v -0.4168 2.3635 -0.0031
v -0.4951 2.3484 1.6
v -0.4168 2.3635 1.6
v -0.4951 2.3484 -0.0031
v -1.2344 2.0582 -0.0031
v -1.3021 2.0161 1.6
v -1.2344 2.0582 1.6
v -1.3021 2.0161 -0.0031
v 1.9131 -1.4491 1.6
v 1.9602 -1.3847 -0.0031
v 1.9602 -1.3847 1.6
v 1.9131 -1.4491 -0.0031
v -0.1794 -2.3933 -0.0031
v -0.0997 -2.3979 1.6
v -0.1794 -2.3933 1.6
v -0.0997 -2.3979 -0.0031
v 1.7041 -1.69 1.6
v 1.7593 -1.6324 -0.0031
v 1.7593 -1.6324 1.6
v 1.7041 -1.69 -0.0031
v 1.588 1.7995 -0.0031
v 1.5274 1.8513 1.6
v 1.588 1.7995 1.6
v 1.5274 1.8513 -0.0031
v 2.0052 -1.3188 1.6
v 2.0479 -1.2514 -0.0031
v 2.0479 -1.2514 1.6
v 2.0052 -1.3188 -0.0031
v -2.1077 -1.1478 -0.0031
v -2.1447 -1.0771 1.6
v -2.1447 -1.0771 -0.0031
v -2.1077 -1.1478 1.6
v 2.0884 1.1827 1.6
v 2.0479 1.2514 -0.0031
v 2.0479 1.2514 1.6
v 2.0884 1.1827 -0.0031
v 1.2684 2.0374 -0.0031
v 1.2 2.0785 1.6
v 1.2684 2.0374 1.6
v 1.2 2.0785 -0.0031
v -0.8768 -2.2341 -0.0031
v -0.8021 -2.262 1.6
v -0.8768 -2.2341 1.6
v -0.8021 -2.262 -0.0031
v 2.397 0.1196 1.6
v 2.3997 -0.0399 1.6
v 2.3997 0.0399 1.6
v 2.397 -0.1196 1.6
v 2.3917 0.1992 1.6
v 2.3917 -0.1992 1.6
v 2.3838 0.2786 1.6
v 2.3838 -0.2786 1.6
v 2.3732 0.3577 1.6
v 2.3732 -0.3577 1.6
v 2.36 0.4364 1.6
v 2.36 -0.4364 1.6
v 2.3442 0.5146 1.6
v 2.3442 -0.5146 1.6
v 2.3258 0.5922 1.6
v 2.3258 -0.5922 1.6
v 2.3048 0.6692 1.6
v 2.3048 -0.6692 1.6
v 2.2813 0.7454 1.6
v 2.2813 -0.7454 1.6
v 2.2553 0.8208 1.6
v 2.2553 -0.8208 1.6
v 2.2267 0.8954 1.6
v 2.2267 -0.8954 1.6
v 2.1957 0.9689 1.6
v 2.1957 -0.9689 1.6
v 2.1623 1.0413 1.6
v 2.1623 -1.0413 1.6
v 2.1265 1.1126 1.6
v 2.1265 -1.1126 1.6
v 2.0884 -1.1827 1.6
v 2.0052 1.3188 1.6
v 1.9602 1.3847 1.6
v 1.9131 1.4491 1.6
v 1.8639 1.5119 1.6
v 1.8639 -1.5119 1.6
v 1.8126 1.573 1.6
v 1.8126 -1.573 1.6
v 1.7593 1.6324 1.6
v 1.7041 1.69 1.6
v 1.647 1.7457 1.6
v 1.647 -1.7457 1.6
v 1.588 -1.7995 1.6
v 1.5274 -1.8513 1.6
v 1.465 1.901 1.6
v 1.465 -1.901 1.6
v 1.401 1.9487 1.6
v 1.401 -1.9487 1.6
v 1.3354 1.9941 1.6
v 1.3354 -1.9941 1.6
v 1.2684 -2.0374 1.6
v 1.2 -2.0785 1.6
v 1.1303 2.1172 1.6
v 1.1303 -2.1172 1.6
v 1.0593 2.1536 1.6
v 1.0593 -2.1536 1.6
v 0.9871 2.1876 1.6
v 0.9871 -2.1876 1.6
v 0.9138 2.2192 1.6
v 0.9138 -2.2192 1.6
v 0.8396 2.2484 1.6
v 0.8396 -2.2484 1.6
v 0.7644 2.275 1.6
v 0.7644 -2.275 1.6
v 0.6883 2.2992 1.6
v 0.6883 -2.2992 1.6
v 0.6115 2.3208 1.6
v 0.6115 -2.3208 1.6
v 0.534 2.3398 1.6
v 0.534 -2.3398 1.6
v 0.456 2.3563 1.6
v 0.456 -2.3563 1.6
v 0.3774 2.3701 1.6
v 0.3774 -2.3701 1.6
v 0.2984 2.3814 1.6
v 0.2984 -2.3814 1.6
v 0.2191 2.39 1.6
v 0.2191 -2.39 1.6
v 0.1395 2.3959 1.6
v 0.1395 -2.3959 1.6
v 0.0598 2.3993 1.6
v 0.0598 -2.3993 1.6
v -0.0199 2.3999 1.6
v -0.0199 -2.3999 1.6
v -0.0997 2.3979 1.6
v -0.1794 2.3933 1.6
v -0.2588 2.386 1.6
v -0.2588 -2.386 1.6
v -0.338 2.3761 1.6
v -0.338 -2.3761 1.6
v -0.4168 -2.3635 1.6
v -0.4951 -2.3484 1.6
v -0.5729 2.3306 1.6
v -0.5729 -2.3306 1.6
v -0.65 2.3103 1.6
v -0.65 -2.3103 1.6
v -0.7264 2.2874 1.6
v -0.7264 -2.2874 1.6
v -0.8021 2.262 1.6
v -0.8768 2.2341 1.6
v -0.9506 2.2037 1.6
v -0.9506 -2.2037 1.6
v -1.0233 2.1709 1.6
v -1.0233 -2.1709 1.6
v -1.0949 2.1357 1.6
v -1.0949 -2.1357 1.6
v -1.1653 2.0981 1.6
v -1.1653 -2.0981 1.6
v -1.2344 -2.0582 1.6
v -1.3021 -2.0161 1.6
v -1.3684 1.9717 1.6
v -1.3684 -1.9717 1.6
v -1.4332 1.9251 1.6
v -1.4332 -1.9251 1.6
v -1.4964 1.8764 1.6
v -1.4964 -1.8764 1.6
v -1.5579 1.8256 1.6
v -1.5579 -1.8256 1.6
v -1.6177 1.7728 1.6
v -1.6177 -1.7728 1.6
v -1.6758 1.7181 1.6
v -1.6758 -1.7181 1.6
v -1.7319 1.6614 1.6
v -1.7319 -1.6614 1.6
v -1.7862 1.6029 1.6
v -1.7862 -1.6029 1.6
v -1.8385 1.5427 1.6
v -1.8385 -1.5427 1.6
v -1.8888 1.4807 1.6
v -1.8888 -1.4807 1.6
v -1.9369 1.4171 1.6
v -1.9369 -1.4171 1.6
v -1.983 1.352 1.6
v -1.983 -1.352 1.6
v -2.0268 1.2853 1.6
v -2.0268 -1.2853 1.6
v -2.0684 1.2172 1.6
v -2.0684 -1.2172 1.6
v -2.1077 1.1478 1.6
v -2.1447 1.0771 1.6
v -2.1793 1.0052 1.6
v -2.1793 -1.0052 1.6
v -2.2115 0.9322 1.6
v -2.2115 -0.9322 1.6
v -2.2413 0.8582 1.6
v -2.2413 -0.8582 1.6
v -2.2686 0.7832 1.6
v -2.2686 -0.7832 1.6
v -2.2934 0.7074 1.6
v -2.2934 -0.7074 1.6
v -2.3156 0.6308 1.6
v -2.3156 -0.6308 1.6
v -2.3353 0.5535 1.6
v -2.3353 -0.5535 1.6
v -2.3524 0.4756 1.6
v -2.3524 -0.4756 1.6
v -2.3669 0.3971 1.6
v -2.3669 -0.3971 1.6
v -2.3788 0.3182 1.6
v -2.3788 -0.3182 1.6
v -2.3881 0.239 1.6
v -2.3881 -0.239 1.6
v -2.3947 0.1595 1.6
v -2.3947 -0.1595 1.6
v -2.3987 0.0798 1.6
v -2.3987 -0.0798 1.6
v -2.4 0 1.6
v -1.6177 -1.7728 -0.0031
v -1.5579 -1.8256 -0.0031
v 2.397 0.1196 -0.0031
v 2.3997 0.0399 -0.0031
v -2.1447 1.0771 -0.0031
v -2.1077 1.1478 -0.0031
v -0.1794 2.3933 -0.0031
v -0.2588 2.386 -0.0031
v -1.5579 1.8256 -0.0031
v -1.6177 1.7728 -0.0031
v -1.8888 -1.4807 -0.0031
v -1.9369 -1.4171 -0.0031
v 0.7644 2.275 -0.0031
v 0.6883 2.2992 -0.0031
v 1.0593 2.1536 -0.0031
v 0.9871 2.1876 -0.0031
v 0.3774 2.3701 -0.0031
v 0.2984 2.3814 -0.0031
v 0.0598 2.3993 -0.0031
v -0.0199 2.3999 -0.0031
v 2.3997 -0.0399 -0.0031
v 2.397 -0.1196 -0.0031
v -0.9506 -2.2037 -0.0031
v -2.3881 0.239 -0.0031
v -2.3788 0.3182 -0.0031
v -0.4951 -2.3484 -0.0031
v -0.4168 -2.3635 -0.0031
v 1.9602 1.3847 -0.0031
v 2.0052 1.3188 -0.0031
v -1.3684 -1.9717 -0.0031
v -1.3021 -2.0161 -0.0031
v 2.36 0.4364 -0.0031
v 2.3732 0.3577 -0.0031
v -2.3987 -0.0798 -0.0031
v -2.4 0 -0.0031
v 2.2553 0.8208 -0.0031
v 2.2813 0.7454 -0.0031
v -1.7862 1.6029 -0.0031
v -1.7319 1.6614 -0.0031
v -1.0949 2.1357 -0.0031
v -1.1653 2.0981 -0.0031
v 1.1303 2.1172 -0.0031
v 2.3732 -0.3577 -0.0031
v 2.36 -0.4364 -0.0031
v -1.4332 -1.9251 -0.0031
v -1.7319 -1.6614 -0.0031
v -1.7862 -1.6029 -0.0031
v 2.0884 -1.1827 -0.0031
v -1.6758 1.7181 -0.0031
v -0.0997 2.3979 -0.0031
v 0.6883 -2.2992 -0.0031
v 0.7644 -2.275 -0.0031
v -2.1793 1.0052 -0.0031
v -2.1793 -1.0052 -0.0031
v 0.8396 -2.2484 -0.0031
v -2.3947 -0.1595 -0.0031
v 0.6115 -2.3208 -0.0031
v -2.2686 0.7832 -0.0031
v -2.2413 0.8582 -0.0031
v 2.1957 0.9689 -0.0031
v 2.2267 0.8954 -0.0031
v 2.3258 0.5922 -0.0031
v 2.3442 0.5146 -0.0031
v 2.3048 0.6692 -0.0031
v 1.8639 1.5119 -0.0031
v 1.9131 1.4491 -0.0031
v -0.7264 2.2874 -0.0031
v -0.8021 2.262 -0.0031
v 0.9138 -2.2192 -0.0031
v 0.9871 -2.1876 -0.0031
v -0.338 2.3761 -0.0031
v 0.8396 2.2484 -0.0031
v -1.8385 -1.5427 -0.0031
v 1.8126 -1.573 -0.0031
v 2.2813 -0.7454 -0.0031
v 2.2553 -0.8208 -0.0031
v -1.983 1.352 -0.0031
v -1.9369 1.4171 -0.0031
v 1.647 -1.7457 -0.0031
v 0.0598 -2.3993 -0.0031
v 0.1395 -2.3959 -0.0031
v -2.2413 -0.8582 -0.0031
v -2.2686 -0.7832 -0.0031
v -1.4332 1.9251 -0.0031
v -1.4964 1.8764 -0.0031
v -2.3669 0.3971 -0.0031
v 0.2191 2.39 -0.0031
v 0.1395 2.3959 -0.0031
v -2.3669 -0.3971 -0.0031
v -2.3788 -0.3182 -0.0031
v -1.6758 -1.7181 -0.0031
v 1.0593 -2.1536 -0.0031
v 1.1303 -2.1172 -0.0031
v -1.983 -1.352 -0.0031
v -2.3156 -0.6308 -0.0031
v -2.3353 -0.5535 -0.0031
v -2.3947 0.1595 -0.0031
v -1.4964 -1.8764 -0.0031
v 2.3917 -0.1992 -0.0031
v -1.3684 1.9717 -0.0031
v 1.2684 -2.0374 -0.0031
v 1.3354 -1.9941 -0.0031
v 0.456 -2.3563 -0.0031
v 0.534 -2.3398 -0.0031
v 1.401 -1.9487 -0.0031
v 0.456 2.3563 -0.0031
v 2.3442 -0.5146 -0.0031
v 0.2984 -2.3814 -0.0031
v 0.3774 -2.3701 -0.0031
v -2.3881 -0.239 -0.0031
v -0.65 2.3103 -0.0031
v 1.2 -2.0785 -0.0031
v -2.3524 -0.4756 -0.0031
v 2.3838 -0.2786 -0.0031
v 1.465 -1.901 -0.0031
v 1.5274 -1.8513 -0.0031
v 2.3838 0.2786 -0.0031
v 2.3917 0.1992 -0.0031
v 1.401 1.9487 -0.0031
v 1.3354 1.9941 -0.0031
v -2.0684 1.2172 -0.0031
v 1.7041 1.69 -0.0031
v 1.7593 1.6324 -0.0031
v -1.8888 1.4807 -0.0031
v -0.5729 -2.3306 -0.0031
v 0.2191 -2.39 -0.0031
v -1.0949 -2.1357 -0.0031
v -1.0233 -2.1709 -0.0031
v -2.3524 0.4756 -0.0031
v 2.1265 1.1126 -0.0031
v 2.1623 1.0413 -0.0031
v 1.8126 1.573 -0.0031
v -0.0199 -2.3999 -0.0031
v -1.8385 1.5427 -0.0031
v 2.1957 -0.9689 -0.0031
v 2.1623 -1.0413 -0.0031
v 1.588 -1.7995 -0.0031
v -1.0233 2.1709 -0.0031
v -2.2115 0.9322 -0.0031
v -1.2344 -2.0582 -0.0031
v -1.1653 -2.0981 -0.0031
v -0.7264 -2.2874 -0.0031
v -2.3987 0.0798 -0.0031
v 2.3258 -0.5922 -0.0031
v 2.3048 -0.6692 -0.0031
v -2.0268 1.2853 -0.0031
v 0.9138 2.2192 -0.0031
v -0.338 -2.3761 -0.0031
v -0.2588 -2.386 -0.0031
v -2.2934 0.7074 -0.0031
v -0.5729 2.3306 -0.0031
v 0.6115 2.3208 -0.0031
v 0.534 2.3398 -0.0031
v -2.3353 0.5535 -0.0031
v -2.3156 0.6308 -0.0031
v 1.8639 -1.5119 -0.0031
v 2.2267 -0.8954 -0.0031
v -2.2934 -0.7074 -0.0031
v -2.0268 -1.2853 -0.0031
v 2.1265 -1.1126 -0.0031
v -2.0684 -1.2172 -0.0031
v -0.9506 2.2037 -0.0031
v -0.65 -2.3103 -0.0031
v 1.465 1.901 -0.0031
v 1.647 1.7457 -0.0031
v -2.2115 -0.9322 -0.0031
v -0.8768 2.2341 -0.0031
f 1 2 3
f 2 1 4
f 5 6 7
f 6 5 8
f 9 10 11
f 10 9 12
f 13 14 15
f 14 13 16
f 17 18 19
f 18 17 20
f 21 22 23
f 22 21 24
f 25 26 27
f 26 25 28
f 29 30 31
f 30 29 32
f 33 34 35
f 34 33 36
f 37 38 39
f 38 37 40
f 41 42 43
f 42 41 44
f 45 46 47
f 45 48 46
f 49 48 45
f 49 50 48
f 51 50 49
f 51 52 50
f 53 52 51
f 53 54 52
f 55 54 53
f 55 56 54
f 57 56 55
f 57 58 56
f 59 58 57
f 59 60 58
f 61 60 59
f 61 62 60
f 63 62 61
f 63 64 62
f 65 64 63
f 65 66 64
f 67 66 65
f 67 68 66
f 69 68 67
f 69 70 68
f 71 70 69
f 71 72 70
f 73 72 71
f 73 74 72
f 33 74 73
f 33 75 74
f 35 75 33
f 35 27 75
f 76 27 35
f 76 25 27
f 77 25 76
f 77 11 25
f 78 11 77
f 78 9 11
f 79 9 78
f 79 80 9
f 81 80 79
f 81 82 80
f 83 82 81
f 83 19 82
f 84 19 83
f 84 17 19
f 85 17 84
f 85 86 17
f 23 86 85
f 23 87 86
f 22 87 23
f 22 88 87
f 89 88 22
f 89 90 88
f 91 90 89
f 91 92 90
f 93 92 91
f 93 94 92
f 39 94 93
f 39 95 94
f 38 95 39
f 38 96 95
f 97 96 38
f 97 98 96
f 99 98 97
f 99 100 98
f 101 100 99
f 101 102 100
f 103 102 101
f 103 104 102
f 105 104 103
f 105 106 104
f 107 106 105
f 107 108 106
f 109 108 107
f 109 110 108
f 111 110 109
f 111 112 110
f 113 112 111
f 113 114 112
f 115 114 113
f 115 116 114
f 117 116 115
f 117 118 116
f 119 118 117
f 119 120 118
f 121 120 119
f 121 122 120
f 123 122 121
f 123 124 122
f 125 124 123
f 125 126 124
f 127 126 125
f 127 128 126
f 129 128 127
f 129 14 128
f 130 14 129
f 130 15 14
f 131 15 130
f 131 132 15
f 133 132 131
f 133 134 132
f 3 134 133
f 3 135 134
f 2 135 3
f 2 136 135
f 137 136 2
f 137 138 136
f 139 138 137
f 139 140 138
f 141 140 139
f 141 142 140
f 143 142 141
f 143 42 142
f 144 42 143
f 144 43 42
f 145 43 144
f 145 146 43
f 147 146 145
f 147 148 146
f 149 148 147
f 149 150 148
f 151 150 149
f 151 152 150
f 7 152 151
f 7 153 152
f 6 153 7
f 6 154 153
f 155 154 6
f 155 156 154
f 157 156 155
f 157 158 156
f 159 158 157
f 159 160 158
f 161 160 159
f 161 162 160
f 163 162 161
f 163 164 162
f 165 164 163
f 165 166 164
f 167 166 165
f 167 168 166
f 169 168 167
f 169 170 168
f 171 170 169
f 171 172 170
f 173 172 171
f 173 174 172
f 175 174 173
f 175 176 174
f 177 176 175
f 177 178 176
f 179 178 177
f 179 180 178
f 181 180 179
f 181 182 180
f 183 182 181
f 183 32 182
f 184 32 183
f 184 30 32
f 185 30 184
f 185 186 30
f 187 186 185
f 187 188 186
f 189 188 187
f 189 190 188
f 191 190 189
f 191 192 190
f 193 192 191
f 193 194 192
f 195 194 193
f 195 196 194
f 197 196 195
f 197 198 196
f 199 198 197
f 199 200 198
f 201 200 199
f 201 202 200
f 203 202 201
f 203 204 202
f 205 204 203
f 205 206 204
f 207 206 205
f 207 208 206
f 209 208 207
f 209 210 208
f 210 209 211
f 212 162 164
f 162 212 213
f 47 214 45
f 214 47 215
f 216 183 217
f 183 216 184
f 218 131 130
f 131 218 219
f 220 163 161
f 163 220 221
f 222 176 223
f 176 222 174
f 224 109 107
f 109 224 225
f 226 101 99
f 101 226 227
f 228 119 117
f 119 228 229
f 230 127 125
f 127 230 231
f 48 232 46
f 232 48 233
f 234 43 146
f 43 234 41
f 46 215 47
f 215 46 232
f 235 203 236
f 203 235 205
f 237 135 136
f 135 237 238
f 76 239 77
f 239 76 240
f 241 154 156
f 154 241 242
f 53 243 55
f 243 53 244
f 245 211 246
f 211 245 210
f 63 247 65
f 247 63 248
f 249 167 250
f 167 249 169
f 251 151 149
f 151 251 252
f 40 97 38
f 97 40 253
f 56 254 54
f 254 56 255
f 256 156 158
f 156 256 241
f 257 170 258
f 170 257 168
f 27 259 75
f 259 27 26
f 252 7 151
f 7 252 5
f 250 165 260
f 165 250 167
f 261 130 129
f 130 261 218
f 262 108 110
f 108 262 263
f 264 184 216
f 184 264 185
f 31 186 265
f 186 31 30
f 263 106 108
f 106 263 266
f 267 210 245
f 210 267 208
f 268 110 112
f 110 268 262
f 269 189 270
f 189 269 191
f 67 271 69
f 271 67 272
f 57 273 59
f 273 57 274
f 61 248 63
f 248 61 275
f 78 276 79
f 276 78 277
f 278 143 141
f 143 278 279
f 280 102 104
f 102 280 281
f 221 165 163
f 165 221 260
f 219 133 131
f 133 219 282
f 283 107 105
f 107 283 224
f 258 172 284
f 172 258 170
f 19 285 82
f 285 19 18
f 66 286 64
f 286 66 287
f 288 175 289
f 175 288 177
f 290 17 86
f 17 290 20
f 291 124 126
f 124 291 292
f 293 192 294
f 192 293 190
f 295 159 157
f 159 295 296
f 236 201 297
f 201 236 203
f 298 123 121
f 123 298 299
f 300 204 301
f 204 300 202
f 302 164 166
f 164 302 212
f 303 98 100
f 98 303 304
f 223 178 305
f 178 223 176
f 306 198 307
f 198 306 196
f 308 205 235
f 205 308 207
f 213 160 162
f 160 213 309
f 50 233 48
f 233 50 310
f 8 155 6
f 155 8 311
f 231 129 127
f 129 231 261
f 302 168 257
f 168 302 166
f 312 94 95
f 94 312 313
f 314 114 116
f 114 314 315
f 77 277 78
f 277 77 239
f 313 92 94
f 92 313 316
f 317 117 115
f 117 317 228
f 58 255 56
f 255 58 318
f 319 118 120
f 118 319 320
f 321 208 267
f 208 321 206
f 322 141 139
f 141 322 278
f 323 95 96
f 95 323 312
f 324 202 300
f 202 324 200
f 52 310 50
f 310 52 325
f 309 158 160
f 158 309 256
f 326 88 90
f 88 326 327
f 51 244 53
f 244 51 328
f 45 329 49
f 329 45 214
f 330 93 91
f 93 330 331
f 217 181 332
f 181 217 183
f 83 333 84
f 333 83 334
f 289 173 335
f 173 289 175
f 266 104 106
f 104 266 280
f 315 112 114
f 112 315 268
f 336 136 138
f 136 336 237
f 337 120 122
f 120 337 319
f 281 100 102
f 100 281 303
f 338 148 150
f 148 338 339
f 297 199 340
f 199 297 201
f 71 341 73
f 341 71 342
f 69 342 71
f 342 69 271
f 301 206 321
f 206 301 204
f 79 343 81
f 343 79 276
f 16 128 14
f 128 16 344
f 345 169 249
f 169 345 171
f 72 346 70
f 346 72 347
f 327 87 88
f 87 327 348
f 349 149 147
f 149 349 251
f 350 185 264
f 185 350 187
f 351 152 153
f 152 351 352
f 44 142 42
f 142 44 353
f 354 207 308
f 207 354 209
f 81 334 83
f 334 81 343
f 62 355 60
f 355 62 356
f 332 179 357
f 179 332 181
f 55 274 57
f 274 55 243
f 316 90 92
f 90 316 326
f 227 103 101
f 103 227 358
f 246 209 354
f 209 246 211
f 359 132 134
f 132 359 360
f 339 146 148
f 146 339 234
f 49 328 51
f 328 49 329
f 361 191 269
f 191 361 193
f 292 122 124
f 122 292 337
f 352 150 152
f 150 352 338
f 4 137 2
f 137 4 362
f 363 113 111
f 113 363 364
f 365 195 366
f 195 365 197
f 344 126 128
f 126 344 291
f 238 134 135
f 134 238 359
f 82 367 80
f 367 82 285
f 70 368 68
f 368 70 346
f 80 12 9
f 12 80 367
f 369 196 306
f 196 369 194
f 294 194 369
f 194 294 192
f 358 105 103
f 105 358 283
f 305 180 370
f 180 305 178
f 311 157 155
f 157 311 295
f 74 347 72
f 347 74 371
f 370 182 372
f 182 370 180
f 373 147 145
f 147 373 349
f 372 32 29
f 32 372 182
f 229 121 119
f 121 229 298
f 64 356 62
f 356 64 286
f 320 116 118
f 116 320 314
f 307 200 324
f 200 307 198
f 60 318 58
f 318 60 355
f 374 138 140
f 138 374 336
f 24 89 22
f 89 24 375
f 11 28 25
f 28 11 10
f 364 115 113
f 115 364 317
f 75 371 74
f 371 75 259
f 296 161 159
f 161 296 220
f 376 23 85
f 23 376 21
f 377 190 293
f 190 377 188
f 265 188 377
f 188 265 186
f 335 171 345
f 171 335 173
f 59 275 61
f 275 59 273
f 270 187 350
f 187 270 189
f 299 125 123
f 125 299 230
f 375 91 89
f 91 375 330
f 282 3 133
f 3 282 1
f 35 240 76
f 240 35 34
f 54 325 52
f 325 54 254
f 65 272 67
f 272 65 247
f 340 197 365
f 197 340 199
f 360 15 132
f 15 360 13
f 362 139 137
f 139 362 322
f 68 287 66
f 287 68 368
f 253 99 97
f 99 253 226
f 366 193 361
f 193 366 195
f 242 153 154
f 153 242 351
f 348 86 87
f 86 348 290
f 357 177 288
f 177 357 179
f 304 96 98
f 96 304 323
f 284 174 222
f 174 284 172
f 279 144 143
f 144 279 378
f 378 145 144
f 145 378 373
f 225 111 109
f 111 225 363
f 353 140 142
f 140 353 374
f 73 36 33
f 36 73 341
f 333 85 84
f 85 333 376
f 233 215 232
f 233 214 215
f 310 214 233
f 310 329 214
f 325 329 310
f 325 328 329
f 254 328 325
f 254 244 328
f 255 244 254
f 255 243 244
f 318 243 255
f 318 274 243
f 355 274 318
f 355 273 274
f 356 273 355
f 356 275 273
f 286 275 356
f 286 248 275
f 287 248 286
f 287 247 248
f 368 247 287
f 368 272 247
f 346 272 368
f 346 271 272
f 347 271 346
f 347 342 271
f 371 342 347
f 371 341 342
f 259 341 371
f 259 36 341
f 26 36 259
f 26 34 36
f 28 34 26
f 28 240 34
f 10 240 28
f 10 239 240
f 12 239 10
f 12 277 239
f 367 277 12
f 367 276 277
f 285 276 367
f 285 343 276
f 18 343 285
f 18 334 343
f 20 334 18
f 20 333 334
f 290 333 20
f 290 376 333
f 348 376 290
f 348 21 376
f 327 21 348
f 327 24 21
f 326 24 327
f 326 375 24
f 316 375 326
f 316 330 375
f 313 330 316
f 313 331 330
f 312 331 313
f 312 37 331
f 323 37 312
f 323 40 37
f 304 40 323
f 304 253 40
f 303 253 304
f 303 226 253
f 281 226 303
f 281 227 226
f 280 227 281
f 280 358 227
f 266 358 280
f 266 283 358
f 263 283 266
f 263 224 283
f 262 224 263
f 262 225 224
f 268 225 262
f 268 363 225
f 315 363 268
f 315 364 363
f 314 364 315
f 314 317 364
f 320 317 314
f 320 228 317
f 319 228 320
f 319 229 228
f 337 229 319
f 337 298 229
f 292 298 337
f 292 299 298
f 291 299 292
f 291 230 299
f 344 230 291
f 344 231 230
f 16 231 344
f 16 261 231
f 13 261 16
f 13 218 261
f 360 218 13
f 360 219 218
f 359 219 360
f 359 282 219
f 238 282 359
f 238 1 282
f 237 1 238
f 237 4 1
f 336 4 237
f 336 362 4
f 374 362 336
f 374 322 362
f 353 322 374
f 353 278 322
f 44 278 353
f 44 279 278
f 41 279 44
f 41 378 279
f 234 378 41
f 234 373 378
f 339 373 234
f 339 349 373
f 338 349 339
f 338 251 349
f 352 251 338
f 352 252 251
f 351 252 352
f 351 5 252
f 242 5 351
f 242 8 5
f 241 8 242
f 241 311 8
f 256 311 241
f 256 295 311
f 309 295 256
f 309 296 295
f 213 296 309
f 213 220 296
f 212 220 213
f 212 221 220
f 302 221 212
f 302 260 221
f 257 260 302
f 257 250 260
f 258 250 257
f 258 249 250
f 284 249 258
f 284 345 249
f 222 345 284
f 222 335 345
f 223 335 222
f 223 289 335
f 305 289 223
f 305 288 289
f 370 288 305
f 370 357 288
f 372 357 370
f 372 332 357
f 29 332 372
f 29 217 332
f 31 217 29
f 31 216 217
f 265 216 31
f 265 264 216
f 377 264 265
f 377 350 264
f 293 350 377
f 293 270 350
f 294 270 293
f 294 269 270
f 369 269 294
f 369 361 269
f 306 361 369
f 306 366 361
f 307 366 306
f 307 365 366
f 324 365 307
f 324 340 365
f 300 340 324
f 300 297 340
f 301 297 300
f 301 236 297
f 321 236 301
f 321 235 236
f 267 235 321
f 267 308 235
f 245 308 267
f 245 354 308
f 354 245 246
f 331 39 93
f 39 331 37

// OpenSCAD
use <../lib.scad>
use <../p/1-4disc.scad>
use <../p/1-4ndis.scad>
use <../p/3-8disc.scad>
use <s/4088s01.scad>
use <s/4088s02.scad>
$fa=1; $fs=0.2;
function ldraw_lib__4088b(realsolid=false) = [
// 0 Brick  1 x  4 x  2 with Centre Stud Top with Underside Reinforcement
// 0 Name: 4088b.dat
// 0 Author: Chris Dee [cwdee]
// 0 !LDRAW_ORG Part UPDATE 2018-01
// 0 !LICENSE Licensed under CC BY 2.0 and CC BY 4.0 : see CAreadme.txt
// 
// 0 BFC CERTIFY CCW
  [0,"BFC","CERTIFY"],
  [0,"BFC","CCW"],
// 
// 0 !HISTORY 2000-05-07 [PTadmin] Official Update 2000-01
// 0 !HISTORY 2007-07-01 [PTadmin] Header formatted for Contributor Agreement
// 0 !HISTORY 2008-07-01 [PTadmin] Official Update 2008-01
// 0 !HISTORY 2008-07-07 [guyvivan] Made BFC compliant and add underside detail (2005-02-21)
// 0 !HISTORY 2009-05-02 [PTadmin] Official Update 2009-01
// 0 !HISTORY 2017-11-23 [PTadmin] Renamed from 4088
// 0 !HISTORY 2018-01-30 [PTadmin] Official Update 2018-01
// 
// 
// 0 // Front Surface
// 
// 1 16 17 3 -10 3 0 0 0 0 -3 0 1 0 1-4disc.dat
  [1,16,17,3,-10,3,0,0,0,0,-3,0,1,0, ldraw_lib__1_4disc(realsolid)],
// 1 16 -17 3 -10 -3 0 0 0 0 -3 0 1 0 1-4disc.dat
  [1,16,-17,3,-10,-3,0,0,0,0,-3,0,1,0, ldraw_lib__1_4disc(realsolid)],
// 4 16 17 0 -10 -17 0 -10 -17 3 -10 17 3 -10
  [4,16,17,0,-10,-17,0,-10,-17,3,-10,17,3,-10],
// 4 16 20 3 -10 -20 3 -10 -20 48 -10 20 48 -10
  [4,16,20,3,-10,-20,3,-10,-20,48,-10,20,48,-10],
// 4 16 -20 48 -10 -20 31 -10 -40 31 -10 -40 48 -10
  [4,16,-20,48,-10,-20,31,-10,-40,31,-10,-40,48,-10],
// 4 16 40 48 -10 40 31 -10 20 31 -10 20 48 -10
  [4,16,40,48,-10,40,31,-10,20,31,-10,20,48,-10],
// 1 16 30 31 -10 10 0 0 0 0 -10 0 1 0 3-8disc.dat
  [1,16,30,31,-10,10,0,0,0,0,-10,0,1,0, ldraw_lib__3_8disc(realsolid)],
// 1 16 21.5 24 -10 -1.5 0 0 0 0 1.5 0 1 0 1-4ndis.dat
  [1,16,21.5,24,-10,-1.5,0,0,0,0,1.5,0,1,0, ldraw_lib__1_4ndis(realsolid)],
// 4 16 21.5 25.5 -10 20 25.5 -10 20 31 -10 21.5 31 -10
  [4,16,21.5,25.5,-10,20,25.5,-10,20,31,-10,21.5,31,-10],
// 3 16 21.5 31 -10 30 31 -10 21.5 25.5 -10
  [3,16,21.5,31,-10,30,31,-10,21.5,25.5,-10],
// 3 16 21.5 25.5 -10 30 31 -10 22.074 25.386 -10
  [3,16,21.5,25.5,-10,30,31,-10,22.074,25.386,-10],
// 3 16 22.074 25.386 -10 30 31 -10 22.561 25.061 -10
  [3,16,22.074,25.386,-10,30,31,-10,22.561,25.061,-10],
// 3 16 22.561 25.061 -10 30 31 -10 22.929 23.929 -10
  [3,16,22.561,25.061,-10,30,31,-10,22.929,23.929,-10],
// 1 16 -30 31 -10 -10 0 0 0 0 -10 0 1 0 3-8disc.dat
  [1,16,-30,31,-10,-10,0,0,0,0,-10,0,1,0, ldraw_lib__3_8disc(realsolid)],
// 1 16 -21.5 24 -10 1.5 0 0 0 0 1.5 0 1 0 1-4ndis.dat
  [1,16,-21.5,24,-10,1.5,0,0,0,0,1.5,0,1,0, ldraw_lib__1_4ndis(realsolid)],
// 4 16 -20 25.5 -10 -21.5 25.5 -10 -21.5 31 -10 -20 31 -10
  [4,16,-20,25.5,-10,-21.5,25.5,-10,-21.5,31,-10,-20,31,-10],
// 3 16 -30 31 -10 -21.5 31 -10 -21.5 25.5 -10
  [3,16,-30,31,-10,-21.5,31,-10,-21.5,25.5,-10],
// 3 16 -30 31 -10 -21.5 25.5 -10 -22.074 25.386 -10
  [3,16,-30,31,-10,-21.5,25.5,-10,-22.074,25.386,-10],
// 3 16 -30 31 -10 -22.074 25.386 -10 -22.561 25.061 -10
  [3,16,-30,31,-10,-22.074,25.386,-10,-22.561,25.061,-10],
// 3 16 -30 31 -10 -22.561 25.061 -10 -22.929 23.929 -10
  [3,16,-30,31,-10,-22.561,25.061,-10,-22.929,23.929,-10],
// 0 // Main structure
// 1 16 0 0 0 1 0 0 0 1 0 0 0 1 s\4088s01.dat
  [1,16,0,0,0,1,0,0,0,1,0,0,0,1, ldraw_lib__s__4088s01(realsolid)],
// 0 // Underside reinforcement
// 1 16 0 0 0 1 0 0 0 1 0 0 0 1 s\4088s02.dat
  [1,16,0,0,0,1,0,0,0,1,0,0,0,1, ldraw_lib__s__4088s02(realsolid)],
];
module ldraw_lib__4088b(step=0, col=false, unit=2/5, alt=false, line=0.2, solid=!$preview)
    makepoly(ldraw_lib__4088b(solid), step=step, col=col, unit=unit, alt=alt, line=line, solid=solid);
ldraw_lib__4088b(line=0.2);
